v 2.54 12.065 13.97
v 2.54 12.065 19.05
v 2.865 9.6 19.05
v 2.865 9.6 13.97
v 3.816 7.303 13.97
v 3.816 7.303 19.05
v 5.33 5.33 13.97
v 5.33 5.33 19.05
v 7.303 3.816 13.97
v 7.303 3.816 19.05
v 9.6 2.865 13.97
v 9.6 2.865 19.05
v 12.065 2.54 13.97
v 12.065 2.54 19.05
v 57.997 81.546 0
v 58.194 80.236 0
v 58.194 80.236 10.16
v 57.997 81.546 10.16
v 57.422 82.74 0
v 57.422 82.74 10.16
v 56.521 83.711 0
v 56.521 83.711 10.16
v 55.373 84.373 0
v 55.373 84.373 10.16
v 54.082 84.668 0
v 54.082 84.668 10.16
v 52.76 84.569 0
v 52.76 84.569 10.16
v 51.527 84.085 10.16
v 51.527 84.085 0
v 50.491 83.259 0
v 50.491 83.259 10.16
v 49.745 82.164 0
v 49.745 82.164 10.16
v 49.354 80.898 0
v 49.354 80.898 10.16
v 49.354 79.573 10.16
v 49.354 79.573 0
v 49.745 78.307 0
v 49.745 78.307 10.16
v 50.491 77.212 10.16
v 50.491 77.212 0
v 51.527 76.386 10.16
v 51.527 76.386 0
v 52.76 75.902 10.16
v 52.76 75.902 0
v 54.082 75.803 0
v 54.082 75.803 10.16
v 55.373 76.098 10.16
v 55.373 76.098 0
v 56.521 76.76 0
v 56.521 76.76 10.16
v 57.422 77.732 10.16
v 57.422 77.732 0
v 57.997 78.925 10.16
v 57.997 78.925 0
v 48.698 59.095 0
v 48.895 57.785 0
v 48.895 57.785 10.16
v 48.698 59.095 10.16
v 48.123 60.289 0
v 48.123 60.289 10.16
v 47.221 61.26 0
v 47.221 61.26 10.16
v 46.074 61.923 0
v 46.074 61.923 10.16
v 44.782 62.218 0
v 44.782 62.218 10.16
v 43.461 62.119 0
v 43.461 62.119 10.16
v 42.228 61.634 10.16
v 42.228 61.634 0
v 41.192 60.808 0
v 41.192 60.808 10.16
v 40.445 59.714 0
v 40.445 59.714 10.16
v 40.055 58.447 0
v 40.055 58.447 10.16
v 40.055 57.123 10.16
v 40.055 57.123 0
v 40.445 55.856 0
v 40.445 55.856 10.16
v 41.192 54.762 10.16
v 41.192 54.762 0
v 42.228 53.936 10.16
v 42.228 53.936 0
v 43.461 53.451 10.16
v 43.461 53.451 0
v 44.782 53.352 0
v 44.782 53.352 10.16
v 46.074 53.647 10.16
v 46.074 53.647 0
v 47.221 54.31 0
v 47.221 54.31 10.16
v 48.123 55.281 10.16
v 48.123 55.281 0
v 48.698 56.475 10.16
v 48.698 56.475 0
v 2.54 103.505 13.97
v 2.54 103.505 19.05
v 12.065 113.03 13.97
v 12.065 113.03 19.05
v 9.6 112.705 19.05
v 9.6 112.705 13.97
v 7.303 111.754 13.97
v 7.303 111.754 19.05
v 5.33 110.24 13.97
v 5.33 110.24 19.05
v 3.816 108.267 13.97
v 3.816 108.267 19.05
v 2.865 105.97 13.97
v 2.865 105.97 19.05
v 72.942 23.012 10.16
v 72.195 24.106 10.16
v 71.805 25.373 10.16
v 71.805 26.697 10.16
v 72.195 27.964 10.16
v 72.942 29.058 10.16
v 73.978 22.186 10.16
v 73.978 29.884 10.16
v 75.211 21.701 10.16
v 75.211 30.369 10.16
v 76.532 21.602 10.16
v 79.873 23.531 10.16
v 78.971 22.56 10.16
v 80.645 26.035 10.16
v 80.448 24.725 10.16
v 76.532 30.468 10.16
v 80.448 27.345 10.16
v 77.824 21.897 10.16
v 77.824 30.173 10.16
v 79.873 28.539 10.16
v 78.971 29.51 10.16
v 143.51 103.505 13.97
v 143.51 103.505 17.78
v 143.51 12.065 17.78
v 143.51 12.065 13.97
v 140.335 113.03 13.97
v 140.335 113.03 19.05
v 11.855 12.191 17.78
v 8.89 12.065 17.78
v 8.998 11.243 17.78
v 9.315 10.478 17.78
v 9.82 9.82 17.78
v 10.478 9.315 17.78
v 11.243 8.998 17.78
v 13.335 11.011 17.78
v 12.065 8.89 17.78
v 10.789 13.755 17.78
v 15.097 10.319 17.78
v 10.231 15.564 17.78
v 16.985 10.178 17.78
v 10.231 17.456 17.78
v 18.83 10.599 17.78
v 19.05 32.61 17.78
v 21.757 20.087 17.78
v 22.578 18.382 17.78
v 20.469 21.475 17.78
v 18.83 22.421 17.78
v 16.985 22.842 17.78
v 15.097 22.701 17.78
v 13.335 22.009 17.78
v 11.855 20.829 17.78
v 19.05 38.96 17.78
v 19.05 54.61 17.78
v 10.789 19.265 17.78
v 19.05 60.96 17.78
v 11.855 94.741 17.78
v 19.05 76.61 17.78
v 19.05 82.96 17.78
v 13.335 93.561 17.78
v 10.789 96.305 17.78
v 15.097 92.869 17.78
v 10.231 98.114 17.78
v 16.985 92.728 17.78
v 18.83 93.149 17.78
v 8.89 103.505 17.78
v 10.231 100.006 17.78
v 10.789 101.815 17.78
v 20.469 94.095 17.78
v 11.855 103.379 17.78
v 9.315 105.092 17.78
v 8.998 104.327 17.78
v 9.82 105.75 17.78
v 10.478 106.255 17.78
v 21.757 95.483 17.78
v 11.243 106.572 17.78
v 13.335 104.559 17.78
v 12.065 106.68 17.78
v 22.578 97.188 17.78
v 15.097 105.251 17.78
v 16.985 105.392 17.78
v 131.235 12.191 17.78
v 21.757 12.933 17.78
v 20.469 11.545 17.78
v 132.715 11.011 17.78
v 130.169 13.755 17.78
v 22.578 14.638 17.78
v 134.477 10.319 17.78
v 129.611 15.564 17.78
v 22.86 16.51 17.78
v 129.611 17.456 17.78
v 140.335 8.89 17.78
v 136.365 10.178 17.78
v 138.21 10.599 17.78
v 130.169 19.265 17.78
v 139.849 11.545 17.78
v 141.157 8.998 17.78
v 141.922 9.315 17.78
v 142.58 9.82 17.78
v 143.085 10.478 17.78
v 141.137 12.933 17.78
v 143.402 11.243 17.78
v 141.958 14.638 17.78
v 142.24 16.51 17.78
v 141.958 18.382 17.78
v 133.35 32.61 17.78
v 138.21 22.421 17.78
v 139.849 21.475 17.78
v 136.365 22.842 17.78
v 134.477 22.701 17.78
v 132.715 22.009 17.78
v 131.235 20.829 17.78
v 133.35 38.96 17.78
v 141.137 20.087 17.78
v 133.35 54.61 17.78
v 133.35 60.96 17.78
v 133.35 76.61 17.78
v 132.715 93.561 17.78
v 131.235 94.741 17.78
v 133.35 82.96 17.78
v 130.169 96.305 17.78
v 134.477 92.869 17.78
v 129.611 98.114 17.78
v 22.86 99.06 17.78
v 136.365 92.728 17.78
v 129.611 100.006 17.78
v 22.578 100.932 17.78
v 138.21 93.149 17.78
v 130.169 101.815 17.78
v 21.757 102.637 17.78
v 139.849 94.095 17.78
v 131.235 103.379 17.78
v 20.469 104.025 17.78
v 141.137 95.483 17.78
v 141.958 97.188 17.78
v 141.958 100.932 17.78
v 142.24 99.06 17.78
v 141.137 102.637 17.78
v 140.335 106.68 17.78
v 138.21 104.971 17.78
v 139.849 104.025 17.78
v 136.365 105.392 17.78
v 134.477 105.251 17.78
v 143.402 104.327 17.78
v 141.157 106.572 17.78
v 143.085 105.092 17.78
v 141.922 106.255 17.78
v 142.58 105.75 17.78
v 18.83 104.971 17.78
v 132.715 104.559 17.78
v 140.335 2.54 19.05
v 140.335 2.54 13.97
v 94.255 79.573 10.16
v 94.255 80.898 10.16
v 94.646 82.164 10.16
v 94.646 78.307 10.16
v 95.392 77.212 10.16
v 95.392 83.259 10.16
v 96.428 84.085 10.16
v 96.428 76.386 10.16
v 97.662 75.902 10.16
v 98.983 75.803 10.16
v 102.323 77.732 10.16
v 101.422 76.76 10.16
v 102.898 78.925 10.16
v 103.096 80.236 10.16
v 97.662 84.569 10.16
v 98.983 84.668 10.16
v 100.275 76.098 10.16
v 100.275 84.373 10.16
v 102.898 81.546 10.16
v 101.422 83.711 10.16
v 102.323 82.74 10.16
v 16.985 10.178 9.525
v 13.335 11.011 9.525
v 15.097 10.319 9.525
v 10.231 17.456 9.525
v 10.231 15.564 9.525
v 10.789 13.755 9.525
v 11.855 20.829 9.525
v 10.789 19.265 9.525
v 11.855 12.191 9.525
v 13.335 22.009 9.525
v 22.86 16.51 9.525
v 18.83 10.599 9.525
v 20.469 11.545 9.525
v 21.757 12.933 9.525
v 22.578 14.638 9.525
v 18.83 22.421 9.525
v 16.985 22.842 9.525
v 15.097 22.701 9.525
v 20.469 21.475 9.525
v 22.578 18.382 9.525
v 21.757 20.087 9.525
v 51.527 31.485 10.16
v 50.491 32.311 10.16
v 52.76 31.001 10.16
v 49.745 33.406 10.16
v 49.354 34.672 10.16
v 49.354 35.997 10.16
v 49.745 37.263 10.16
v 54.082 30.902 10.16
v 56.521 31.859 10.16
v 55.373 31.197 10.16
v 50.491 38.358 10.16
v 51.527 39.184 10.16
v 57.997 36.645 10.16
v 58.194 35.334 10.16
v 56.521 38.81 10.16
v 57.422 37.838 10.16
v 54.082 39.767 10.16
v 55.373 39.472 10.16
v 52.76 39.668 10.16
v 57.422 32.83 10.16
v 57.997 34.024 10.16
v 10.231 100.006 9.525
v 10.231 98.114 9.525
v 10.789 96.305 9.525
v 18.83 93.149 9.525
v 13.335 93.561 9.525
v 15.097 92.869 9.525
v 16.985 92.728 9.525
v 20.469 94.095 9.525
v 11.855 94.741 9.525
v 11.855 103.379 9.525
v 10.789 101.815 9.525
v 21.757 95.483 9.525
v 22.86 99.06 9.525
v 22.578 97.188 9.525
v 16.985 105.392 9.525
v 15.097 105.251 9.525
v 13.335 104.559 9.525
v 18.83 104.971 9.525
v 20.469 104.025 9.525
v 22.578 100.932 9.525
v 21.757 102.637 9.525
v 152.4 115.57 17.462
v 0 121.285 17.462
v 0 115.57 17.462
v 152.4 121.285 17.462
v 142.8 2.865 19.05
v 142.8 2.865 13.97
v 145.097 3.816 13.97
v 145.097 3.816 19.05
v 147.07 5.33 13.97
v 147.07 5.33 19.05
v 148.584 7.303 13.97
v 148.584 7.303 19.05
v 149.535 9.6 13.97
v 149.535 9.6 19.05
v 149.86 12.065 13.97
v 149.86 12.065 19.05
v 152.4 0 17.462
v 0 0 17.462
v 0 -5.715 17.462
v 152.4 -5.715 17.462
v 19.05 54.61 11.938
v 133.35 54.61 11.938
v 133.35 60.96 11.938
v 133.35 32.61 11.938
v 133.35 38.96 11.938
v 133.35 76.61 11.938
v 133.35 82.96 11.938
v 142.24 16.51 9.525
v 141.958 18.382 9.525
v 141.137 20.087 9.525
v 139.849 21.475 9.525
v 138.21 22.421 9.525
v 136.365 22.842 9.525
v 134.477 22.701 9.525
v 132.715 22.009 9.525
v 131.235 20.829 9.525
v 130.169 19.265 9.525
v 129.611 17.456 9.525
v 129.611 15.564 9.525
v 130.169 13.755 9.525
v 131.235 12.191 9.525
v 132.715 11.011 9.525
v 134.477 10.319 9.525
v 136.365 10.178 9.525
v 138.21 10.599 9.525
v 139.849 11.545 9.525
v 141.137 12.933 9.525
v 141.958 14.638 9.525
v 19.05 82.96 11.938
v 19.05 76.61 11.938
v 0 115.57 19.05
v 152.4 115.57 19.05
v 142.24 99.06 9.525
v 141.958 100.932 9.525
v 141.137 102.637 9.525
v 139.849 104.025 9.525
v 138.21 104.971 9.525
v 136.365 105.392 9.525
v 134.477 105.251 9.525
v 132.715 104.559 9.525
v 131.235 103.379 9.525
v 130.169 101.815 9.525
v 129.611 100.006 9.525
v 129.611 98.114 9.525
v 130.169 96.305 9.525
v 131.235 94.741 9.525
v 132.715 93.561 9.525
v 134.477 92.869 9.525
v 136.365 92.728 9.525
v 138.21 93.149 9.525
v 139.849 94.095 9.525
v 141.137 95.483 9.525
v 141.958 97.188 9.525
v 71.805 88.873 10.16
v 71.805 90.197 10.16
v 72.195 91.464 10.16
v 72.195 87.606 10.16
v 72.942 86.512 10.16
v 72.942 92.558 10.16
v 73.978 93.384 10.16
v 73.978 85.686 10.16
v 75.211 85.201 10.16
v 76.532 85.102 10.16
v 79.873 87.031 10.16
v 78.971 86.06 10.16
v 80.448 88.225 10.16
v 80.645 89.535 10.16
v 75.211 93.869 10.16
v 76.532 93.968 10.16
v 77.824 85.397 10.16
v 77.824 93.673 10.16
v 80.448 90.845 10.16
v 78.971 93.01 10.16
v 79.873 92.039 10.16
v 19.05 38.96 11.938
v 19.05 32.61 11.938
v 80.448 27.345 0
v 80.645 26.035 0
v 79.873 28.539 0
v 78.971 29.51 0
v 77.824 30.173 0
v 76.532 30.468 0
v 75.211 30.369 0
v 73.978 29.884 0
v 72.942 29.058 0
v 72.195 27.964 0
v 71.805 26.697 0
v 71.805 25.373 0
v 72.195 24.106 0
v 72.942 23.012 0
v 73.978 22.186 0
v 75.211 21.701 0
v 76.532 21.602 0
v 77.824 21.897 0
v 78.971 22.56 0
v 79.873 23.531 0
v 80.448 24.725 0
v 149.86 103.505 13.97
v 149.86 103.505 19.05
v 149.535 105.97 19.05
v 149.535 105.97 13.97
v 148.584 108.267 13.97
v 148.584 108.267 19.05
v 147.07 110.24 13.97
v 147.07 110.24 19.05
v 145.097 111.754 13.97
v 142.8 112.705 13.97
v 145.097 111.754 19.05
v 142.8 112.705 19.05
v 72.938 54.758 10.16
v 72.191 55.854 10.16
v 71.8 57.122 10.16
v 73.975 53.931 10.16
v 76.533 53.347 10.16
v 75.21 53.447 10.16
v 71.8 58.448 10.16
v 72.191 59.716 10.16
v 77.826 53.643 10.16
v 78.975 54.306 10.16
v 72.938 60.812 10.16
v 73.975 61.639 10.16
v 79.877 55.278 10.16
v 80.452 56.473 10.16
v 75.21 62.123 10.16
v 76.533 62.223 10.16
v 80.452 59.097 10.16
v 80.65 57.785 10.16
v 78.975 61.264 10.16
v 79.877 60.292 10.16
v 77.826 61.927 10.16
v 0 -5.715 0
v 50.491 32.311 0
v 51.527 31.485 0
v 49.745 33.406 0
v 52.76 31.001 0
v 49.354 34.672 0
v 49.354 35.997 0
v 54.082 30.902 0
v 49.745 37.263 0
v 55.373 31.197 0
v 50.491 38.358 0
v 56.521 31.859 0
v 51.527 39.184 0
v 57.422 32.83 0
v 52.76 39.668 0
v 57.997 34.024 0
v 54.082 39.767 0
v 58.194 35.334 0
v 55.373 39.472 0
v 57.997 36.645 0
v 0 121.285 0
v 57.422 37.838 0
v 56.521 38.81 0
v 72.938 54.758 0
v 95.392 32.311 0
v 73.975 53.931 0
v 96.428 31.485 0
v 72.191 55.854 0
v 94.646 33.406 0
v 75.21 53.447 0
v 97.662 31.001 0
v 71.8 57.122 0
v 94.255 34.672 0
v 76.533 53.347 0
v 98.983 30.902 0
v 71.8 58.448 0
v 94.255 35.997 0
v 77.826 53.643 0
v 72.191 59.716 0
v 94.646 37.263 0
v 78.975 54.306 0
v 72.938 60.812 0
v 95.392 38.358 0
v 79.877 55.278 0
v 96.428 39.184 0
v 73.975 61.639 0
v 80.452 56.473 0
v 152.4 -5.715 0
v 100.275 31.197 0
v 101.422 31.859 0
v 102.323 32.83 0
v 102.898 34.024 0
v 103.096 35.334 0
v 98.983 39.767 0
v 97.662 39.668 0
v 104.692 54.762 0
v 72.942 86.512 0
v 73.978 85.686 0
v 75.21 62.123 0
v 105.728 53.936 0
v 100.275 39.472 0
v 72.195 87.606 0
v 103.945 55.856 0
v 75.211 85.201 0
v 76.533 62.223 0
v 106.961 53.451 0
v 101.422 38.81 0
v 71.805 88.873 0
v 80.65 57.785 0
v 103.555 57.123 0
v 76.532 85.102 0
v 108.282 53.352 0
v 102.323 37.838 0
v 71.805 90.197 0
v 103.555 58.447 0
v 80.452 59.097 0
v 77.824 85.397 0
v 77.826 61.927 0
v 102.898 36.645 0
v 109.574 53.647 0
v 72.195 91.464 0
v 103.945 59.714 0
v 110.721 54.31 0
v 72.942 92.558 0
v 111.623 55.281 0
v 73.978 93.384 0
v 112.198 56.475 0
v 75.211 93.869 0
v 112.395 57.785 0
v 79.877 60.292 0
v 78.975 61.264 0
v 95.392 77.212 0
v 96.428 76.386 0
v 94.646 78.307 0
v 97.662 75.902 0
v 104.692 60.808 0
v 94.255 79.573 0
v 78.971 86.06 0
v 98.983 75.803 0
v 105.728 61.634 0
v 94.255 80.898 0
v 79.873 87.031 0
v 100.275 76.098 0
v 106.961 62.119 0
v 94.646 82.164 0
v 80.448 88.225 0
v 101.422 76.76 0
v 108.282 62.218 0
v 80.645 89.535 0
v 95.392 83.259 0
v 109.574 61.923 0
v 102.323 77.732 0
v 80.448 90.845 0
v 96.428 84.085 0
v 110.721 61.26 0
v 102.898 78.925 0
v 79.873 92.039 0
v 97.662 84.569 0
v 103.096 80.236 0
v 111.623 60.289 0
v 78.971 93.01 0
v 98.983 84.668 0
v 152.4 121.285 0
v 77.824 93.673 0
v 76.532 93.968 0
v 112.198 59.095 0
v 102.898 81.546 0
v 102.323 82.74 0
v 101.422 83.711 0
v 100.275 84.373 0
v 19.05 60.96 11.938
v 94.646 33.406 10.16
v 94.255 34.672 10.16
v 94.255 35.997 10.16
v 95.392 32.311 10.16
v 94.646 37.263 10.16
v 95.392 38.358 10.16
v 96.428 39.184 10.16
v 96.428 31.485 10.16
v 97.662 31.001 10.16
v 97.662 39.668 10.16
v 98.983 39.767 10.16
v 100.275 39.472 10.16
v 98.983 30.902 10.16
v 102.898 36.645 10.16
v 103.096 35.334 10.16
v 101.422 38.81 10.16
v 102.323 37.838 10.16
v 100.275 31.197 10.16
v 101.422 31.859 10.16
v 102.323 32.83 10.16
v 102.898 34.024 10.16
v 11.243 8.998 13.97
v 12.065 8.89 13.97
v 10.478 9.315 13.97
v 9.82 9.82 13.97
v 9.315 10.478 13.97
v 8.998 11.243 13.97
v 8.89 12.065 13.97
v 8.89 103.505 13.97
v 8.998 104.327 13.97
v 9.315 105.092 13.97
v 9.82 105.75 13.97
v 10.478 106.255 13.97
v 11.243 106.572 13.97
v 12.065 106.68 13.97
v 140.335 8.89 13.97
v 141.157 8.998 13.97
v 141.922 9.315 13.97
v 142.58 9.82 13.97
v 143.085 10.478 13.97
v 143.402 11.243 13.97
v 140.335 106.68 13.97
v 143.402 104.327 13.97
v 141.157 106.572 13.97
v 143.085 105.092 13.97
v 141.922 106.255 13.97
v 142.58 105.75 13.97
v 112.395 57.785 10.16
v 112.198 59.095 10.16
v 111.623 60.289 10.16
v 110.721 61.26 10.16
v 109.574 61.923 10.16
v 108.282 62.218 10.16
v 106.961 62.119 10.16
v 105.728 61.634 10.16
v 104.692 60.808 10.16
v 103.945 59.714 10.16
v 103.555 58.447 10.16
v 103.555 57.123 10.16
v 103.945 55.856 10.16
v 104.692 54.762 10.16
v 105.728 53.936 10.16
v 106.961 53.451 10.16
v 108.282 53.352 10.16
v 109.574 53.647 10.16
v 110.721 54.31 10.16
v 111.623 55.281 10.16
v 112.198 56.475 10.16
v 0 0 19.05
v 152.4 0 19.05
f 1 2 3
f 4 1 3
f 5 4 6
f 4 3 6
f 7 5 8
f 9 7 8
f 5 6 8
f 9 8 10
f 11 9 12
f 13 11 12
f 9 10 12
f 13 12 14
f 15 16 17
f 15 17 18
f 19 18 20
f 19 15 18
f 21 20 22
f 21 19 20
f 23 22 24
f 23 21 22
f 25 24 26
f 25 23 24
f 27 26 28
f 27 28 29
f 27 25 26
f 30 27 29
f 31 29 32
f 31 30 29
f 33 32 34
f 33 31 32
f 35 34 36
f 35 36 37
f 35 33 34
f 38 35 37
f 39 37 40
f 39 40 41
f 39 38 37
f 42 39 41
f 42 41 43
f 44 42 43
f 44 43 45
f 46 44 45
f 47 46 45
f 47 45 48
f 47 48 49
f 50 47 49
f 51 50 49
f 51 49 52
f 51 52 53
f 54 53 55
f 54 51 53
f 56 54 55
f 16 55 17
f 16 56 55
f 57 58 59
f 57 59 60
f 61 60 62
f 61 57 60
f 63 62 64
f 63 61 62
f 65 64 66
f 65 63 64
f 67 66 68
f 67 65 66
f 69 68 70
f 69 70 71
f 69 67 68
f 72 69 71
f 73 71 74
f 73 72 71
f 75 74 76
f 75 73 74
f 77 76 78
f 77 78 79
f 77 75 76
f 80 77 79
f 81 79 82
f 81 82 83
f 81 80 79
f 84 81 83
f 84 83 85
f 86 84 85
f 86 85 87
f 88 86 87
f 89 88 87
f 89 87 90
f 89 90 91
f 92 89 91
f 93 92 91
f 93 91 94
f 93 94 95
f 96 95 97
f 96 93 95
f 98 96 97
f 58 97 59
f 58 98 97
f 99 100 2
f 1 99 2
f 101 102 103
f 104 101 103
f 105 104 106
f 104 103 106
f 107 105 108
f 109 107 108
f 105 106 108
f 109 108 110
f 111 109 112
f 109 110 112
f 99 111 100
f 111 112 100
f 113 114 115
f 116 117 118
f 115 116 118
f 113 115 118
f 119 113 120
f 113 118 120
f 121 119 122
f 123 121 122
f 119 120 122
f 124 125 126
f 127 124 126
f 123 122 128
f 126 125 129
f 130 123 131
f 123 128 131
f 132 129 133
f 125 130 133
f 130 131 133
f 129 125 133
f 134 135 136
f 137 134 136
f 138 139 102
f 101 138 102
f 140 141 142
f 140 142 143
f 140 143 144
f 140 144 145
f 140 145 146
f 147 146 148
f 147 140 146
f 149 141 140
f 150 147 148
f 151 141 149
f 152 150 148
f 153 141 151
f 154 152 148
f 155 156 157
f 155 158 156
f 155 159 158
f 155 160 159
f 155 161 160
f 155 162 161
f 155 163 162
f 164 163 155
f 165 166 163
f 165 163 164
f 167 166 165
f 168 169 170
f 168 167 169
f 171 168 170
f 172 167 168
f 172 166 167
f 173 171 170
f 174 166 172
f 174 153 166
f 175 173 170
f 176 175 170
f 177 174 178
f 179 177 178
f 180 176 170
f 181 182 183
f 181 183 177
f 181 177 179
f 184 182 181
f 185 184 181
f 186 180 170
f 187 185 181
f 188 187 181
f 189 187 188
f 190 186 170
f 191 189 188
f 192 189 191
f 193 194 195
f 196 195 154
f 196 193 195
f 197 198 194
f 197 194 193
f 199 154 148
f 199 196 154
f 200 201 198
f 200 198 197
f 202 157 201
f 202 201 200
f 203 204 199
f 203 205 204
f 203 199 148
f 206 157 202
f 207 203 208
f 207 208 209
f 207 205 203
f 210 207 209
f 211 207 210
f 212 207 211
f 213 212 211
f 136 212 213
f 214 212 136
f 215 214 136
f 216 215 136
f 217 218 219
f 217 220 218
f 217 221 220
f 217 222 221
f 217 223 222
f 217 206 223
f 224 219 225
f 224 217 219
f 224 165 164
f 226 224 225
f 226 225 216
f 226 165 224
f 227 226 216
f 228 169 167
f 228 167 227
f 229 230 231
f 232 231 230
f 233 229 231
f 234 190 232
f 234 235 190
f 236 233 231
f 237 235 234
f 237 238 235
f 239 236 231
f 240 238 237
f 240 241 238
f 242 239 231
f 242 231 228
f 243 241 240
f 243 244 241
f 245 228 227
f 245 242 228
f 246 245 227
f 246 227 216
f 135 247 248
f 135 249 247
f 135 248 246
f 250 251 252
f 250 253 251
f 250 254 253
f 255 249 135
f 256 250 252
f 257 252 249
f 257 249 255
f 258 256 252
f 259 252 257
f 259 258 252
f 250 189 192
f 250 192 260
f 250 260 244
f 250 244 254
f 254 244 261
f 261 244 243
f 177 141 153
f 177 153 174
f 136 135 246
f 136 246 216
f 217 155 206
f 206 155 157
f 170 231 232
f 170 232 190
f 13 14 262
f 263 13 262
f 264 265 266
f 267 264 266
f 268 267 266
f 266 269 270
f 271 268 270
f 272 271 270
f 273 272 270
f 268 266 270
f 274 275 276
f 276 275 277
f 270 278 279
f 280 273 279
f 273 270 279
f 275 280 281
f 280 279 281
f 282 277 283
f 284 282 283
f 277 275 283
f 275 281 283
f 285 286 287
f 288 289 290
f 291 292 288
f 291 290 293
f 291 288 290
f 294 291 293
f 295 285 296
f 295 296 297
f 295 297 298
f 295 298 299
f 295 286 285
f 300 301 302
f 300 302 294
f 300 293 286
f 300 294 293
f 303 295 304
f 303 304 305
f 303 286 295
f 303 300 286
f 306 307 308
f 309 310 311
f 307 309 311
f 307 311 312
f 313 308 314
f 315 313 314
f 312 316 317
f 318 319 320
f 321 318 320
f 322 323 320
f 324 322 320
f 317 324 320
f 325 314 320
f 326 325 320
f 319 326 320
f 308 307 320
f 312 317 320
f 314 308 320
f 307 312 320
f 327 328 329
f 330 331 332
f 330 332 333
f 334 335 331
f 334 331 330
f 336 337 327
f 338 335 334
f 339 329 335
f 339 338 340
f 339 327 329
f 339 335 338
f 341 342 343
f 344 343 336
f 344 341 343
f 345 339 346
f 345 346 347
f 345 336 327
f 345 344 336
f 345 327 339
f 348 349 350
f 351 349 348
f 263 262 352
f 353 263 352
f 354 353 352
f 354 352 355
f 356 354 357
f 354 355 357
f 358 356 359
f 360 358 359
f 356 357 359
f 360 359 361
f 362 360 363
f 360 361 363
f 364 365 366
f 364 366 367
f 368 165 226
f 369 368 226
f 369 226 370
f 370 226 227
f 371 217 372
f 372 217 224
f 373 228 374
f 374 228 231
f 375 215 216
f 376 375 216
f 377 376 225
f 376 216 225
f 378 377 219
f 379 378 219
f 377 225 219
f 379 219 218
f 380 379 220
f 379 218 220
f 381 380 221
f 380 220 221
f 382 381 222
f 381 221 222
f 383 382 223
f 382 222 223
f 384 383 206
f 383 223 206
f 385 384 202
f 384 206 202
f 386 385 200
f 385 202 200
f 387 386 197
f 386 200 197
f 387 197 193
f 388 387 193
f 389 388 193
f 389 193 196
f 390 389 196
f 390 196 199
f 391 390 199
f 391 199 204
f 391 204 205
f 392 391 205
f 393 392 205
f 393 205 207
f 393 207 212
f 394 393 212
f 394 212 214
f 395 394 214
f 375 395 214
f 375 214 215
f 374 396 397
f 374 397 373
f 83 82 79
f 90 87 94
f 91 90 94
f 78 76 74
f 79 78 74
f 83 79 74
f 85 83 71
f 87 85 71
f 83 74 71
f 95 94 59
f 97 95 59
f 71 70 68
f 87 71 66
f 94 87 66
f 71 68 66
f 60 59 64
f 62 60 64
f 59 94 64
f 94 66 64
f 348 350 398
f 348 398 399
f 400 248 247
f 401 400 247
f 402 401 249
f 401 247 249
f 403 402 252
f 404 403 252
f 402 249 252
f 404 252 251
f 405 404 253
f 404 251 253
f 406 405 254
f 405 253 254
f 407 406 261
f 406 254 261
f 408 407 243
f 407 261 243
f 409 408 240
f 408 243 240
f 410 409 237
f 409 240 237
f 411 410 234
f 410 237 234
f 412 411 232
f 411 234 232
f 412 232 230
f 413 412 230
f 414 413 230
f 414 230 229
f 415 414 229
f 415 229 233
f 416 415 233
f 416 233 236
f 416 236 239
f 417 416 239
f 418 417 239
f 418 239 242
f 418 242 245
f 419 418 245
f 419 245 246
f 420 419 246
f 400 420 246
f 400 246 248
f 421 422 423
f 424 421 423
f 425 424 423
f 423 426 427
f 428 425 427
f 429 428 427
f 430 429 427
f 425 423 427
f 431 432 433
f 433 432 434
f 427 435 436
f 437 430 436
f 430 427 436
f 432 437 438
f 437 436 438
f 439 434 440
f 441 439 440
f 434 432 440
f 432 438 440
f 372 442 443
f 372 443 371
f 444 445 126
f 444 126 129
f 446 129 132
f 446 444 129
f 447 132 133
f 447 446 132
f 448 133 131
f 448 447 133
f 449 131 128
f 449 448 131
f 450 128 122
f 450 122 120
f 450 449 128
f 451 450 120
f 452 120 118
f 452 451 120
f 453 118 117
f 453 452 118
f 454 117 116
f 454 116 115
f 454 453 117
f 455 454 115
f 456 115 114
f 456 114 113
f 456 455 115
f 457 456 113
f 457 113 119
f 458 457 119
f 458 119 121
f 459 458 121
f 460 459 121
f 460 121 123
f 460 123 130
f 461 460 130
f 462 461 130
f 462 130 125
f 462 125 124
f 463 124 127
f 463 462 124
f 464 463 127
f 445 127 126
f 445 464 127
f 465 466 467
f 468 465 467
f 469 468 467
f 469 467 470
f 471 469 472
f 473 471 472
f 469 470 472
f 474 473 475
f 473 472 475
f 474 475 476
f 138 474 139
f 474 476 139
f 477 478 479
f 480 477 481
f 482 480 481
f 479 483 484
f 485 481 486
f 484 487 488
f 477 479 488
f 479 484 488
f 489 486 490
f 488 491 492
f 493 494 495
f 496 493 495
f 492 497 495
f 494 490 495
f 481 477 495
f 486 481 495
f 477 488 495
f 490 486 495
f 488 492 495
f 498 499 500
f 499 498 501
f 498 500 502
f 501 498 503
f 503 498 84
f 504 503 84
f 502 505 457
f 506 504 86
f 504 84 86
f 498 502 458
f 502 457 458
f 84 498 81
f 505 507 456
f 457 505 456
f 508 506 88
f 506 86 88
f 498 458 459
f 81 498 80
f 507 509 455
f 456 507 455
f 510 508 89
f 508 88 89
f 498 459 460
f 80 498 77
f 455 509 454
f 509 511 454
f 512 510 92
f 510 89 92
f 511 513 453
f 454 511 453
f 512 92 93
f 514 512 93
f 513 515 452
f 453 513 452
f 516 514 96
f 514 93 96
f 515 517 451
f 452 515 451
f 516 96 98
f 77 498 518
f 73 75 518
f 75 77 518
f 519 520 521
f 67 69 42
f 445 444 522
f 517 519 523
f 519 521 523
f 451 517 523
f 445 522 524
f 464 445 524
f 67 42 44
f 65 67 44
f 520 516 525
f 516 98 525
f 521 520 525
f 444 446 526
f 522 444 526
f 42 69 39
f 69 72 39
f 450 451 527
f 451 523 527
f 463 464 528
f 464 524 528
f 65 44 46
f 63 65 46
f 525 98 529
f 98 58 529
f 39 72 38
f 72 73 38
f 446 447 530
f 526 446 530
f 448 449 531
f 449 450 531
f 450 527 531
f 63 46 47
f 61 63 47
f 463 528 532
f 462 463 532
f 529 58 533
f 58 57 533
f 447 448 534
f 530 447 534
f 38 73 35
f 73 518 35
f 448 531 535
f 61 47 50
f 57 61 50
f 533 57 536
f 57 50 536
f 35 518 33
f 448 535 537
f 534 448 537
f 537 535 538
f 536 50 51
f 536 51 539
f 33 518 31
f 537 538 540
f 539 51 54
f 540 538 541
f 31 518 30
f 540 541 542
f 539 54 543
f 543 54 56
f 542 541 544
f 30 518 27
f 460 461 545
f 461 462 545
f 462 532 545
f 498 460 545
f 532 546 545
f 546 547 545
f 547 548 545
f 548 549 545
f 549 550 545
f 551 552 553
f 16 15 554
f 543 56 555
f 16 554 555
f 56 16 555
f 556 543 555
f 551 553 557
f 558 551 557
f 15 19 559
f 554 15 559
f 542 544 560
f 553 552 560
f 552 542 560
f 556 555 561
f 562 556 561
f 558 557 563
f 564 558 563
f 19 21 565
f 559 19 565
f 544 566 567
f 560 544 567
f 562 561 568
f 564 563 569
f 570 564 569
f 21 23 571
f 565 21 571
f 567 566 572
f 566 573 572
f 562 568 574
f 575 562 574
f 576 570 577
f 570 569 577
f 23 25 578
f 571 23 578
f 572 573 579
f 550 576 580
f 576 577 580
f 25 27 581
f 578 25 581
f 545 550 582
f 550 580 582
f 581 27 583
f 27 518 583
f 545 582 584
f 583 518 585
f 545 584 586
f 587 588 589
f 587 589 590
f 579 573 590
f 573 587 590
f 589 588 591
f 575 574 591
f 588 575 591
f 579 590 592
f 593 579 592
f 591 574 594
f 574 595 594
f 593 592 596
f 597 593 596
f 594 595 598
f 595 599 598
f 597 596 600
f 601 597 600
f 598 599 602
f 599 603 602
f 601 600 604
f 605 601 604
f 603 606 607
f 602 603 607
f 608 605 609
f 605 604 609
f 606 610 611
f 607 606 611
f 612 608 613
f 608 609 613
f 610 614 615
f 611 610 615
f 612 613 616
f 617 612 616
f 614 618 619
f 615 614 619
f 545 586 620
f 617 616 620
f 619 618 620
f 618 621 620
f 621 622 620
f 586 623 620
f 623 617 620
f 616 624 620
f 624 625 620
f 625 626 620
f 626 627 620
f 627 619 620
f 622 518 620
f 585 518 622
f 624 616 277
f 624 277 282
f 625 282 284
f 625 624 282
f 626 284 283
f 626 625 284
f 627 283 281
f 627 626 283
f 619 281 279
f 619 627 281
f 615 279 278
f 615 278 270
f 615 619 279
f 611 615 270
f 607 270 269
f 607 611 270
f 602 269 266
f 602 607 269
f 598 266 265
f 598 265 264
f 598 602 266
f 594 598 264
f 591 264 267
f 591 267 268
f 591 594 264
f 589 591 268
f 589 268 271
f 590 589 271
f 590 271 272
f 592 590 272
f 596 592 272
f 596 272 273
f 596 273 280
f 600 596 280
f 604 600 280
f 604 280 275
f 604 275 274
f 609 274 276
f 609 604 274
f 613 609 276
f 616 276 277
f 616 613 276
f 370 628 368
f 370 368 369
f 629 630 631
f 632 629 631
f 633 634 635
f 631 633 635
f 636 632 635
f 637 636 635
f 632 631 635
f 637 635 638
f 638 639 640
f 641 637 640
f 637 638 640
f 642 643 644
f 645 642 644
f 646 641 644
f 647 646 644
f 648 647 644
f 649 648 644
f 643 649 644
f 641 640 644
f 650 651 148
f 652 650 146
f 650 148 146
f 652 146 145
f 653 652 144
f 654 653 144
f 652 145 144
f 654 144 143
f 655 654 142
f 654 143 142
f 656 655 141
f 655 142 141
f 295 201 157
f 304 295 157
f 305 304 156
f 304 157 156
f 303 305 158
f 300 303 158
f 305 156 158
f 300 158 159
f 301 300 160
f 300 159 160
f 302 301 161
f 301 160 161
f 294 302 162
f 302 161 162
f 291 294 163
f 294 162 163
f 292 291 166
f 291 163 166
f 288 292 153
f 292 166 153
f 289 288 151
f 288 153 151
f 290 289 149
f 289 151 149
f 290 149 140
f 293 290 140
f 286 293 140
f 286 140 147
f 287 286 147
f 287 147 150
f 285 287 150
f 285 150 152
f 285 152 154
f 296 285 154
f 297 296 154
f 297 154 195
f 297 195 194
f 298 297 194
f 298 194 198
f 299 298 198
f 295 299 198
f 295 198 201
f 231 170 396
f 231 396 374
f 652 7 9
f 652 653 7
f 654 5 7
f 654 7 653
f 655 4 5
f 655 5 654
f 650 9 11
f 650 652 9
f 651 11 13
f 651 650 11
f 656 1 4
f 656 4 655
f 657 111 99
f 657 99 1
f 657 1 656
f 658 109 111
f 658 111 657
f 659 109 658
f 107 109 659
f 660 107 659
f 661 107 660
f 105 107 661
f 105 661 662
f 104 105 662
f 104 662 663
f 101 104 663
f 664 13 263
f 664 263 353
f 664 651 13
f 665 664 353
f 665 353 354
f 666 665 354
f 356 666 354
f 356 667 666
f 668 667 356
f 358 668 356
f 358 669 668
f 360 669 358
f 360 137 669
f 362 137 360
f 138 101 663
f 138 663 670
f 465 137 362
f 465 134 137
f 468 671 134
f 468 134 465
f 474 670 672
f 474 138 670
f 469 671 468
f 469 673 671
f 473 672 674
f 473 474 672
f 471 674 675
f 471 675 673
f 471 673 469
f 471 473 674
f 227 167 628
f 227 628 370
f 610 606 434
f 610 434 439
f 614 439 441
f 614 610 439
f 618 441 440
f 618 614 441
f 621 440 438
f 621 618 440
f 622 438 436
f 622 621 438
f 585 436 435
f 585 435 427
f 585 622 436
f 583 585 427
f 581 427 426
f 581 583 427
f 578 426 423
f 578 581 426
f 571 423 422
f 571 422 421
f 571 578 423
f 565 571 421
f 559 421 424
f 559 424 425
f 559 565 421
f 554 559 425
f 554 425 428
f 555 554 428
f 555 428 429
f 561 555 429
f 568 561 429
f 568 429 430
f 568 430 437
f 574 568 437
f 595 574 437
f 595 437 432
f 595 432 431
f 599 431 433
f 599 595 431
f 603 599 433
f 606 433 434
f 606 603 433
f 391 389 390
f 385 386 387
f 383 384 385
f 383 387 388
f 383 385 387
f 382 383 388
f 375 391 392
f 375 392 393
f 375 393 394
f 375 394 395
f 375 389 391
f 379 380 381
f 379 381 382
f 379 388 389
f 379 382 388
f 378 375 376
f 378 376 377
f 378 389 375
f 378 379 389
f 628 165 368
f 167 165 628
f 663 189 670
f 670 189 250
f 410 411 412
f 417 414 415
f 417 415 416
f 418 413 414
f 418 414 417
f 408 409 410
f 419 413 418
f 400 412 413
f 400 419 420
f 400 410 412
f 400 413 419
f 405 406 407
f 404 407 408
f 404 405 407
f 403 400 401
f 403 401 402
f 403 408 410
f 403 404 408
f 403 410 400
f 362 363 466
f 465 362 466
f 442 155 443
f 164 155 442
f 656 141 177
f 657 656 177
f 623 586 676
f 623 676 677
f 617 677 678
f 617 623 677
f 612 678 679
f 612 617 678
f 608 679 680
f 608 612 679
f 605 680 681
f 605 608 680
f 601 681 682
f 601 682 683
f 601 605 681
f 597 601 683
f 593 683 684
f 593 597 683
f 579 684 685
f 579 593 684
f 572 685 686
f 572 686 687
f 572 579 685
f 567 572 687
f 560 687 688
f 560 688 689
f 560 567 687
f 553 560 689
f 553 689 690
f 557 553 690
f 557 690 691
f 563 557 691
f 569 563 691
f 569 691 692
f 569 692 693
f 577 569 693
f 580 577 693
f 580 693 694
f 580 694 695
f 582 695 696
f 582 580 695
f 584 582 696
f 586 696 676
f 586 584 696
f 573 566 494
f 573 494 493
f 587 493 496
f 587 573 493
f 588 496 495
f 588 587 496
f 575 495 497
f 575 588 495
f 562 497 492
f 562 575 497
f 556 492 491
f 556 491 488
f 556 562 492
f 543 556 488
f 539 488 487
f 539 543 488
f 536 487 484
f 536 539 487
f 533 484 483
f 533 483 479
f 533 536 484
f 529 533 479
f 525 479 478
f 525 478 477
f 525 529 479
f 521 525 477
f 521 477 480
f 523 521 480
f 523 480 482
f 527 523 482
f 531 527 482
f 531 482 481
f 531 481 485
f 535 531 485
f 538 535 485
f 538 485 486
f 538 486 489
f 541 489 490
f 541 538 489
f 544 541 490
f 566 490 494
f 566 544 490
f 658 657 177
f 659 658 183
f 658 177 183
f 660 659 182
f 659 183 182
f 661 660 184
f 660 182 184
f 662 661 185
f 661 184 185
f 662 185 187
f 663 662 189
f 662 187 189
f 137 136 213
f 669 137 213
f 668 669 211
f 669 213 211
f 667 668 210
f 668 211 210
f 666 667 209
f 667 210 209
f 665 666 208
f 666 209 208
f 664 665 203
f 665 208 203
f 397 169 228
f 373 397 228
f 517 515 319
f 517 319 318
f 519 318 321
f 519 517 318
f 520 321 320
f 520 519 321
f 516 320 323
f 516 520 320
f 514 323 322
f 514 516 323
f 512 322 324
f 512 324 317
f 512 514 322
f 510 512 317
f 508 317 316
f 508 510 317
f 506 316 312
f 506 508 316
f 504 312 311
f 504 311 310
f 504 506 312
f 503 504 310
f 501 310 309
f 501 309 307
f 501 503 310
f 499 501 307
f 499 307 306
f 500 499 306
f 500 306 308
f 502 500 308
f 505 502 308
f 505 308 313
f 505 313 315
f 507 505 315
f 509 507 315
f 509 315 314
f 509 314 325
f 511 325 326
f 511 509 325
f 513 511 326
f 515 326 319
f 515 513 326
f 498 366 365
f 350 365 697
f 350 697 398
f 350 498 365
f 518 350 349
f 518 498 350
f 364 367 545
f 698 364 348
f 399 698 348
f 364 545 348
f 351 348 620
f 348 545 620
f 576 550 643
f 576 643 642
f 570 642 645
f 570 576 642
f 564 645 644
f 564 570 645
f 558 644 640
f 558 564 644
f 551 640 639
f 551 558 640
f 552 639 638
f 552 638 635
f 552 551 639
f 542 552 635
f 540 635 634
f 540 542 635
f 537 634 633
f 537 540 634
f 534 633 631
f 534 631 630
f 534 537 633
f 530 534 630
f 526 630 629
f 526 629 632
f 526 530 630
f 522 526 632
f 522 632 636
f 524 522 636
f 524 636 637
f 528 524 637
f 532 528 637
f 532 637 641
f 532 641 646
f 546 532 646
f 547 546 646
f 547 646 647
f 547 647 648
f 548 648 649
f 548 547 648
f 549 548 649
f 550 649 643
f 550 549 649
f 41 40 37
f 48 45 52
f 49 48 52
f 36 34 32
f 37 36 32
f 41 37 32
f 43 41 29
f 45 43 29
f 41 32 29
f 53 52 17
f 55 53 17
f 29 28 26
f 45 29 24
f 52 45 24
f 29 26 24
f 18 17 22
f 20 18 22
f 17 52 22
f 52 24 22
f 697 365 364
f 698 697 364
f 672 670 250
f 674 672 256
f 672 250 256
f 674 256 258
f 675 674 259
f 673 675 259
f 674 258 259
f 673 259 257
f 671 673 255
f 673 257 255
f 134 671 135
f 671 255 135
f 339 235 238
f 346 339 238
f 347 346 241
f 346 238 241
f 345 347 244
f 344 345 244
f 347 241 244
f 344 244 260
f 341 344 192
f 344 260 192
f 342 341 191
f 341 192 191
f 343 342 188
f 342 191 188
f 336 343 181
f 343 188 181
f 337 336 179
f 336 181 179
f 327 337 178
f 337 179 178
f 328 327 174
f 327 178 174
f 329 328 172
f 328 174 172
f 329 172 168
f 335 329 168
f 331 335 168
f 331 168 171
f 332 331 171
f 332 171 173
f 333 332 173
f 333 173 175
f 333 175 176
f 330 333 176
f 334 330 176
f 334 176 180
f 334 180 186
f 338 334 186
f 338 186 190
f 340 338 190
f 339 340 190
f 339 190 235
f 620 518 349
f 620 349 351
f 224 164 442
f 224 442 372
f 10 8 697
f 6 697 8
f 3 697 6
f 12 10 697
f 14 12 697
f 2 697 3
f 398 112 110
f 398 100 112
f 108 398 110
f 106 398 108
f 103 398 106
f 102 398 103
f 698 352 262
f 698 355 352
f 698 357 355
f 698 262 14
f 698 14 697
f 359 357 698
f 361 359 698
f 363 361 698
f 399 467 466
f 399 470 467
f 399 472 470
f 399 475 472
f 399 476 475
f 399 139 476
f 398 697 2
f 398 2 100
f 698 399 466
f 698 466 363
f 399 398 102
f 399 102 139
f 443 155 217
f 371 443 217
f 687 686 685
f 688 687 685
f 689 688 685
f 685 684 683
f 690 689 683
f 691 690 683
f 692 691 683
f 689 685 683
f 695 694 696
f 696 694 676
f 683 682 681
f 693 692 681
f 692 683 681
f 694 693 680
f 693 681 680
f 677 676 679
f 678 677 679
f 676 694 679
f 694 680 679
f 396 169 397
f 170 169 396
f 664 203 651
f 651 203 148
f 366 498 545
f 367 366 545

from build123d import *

# Parameters (mm, degrees)
F0_W      = 152.4
F0_H      = 115.57
F1_DEPTH  = 19.05
F3_DEPTH  = 5.08
F4_W      = 114.3
F4_H      = 6.35
F5_DEPTH  = 7.112
F6_DEPTH  = 0.79375
F7_W      = 152.4
F7_H      = 5.715
F8_DEPTH  = 17.4625
F9_DEPTH  = 1.27
F10_R     = 6.35
F11_DEPTH = 9.525
F12_R     = 4.45
F12_R_2   = 4.445
F13_DEPTH = 10.16


with BuildPart() as f1:
    # F0 (on Top) → F1 (new body)
    with BuildSketch(Plane.XY):
        with Locations((76.2, 57.785)):
            Rectangle(F0_W, F0_H)
    extrude(amount=F1_DEPTH)

    # F2 (on face) → F3 (cut)
    with BuildSketch(Plane.XY.offset(19.05)):
        with BuildLine():
            Line((140.335, 113.03), (12.065, 113.03))
            ThreePointArc((12.065, 113.03), (5.329808, 110.240192), (2.54, 103.505))
            Line((2.54, 103.505), (2.54, 12.065))
            ThreePointArc((2.54, 12.065), (5.329808, 5.329808), (12.065, 2.54))
            Line((12.065, 2.54), (140.335, 2.54))
            ThreePointArc((140.335, 2.54), (147.070192, 5.329808), (149.86, 12.065))
            Line((149.86, 12.065), (149.86, 103.505))
            ThreePointArc((149.86, 103.505), (147.070192, 110.240192), (140.335, 113.03))
        make_face()
        with BuildLine():
            ThreePointArc((8.89, 103.505), (9.819936, 105.750064), (12.065, 106.68))
            Line((12.065, 106.68), (140.335, 106.68))
            ThreePointArc((140.335, 106.68), (142.580064, 105.750064), (143.51, 103.505))
            Line((143.51, 103.505), (143.51, 12.065))
            ThreePointArc((143.51, 12.065), (142.580064, 9.819936), (140.335, 8.89))
            Line((140.335, 8.89), (12.065, 8.89))
            ThreePointArc((12.065, 8.89), (9.819936, 9.819936), (8.89, 12.065))
            Line((8.89, 12.065), (8.89, 103.505))
        make_face(mode=Mode.SUBTRACT)
    extrude(amount=-F3_DEPTH, mode=Mode.SUBTRACT)

    # F4 (on face) → F5 (cut)
    with BuildSketch(Plane.XY.offset(19.05)):
        with Locations((76.2, 57.785)):
            Rectangle(F4_W, F4_H)
        with Locations((76.2, 79.785)):
            Rectangle(F4_W, F4_H)
        with Locations((76.2, 35.785)):
            Rectangle(F4_W, F4_H)
    extrude(amount=-F5_DEPTH, mode=Mode.SUBTRACT)

    # F2 (on face) → F6 (cut)
    with BuildSketch(Plane.XY.offset(19.05)):
        with BuildLine():
            Line((140.335, 106.68), (12.065, 106.68))
            ThreePointArc((12.065, 106.68), (9.819936, 105.750064), (8.89, 103.505))
            Line((8.89, 103.505), (8.89, 12.065))
            ThreePointArc((8.89, 12.065), (9.819936, 9.819936), (12.065, 8.89))
            Line((12.065, 8.89), (140.335, 8.89))
            ThreePointArc((140.335, 8.89), (142.580064, 9.819936), (143.51, 12.065))
            Line((143.51, 12.065), (143.51, 103.505))
            ThreePointArc((143.51, 103.505), (142.580064, 105.750064), (140.335, 106.68))
        make_face()
    extrude(amount=-F6_DEPTH, mode=Mode.SUBTRACT)

    # F7 (on face) → F8 (join)
    with BuildSketch(Plane.XY):
        with Locations((76.2, -2.8575)):
            Rectangle(F7_W, F7_H)
        with Locations((76.2, 118.4275)):
            Rectangle(F7_W, F7_H)
    extrude(amount=F8_DEPTH)

    # F2 (on face) → F9 (cut)
    with BuildSketch(Plane.XY.offset(19.05)):
        with BuildLine():
            Line((140.335, 106.68), (12.065, 106.68))
            ThreePointArc((12.065, 106.68), (9.819936, 105.750064), (8.89, 103.505))
            Line((8.89, 103.505), (8.89, 12.065))
            ThreePointArc((8.89, 12.065), (9.819936, 9.819936), (12.065, 8.89))
            Line((12.065, 8.89), (140.335, 8.89))
            ThreePointArc((140.335, 8.89), (142.580064, 9.819936), (143.51, 12.065))
            Line((143.51, 12.065), (143.51, 103.505))
            ThreePointArc((143.51, 103.505), (142.580064, 105.750064), (140.335, 106.68))
        make_face()
    extrude(amount=-F9_DEPTH, mode=Mode.SUBTRACT)

    # F10 (on face) → F11 (cut)
    with BuildSketch(Plane.XY.offset(19.05)):
        with Locations((16.51, 99.06)):
            Circle(F10_R)
        with Locations((135.89, 99.06)):
            Circle(F10_R)
        with Locations((16.51, 16.51)):
            Circle(F10_R)
        with Locations((135.89, 16.51)):
            Circle(F10_R)
    extrude(amount=-F11_DEPTH, mode=Mode.SUBTRACT)

    # F12 (on face) → F13 (cut)
    with BuildSketch(Plane.XY):
        with Locations((76.2, 57.785)):
            Circle(F12_R)
        with Locations((44.45, 57.785)):
            Circle(F12_R_2)
        with Locations((53.74936, 35.33436)):
            Circle(F12_R_2)
        with Locations((76.2, 26.035)):
            Circle(F12_R_2)
        with Locations((98.65064, 35.33436)):
            Circle(F12_R_2)
        with Locations((107.95, 57.785)):
            Circle(F12_R_2)
        with Locations((98.65064, 80.23564)):
            Circle(F12_R_2)
        with Locations((76.2, 89.535)):
            Circle(F12_R_2)
        with Locations((53.74936, 80.23564)):
            Circle(F12_R_2)
    extrude(amount=F13_DEPTH, mode=Mode.SUBTRACT)


solid = f1.part
